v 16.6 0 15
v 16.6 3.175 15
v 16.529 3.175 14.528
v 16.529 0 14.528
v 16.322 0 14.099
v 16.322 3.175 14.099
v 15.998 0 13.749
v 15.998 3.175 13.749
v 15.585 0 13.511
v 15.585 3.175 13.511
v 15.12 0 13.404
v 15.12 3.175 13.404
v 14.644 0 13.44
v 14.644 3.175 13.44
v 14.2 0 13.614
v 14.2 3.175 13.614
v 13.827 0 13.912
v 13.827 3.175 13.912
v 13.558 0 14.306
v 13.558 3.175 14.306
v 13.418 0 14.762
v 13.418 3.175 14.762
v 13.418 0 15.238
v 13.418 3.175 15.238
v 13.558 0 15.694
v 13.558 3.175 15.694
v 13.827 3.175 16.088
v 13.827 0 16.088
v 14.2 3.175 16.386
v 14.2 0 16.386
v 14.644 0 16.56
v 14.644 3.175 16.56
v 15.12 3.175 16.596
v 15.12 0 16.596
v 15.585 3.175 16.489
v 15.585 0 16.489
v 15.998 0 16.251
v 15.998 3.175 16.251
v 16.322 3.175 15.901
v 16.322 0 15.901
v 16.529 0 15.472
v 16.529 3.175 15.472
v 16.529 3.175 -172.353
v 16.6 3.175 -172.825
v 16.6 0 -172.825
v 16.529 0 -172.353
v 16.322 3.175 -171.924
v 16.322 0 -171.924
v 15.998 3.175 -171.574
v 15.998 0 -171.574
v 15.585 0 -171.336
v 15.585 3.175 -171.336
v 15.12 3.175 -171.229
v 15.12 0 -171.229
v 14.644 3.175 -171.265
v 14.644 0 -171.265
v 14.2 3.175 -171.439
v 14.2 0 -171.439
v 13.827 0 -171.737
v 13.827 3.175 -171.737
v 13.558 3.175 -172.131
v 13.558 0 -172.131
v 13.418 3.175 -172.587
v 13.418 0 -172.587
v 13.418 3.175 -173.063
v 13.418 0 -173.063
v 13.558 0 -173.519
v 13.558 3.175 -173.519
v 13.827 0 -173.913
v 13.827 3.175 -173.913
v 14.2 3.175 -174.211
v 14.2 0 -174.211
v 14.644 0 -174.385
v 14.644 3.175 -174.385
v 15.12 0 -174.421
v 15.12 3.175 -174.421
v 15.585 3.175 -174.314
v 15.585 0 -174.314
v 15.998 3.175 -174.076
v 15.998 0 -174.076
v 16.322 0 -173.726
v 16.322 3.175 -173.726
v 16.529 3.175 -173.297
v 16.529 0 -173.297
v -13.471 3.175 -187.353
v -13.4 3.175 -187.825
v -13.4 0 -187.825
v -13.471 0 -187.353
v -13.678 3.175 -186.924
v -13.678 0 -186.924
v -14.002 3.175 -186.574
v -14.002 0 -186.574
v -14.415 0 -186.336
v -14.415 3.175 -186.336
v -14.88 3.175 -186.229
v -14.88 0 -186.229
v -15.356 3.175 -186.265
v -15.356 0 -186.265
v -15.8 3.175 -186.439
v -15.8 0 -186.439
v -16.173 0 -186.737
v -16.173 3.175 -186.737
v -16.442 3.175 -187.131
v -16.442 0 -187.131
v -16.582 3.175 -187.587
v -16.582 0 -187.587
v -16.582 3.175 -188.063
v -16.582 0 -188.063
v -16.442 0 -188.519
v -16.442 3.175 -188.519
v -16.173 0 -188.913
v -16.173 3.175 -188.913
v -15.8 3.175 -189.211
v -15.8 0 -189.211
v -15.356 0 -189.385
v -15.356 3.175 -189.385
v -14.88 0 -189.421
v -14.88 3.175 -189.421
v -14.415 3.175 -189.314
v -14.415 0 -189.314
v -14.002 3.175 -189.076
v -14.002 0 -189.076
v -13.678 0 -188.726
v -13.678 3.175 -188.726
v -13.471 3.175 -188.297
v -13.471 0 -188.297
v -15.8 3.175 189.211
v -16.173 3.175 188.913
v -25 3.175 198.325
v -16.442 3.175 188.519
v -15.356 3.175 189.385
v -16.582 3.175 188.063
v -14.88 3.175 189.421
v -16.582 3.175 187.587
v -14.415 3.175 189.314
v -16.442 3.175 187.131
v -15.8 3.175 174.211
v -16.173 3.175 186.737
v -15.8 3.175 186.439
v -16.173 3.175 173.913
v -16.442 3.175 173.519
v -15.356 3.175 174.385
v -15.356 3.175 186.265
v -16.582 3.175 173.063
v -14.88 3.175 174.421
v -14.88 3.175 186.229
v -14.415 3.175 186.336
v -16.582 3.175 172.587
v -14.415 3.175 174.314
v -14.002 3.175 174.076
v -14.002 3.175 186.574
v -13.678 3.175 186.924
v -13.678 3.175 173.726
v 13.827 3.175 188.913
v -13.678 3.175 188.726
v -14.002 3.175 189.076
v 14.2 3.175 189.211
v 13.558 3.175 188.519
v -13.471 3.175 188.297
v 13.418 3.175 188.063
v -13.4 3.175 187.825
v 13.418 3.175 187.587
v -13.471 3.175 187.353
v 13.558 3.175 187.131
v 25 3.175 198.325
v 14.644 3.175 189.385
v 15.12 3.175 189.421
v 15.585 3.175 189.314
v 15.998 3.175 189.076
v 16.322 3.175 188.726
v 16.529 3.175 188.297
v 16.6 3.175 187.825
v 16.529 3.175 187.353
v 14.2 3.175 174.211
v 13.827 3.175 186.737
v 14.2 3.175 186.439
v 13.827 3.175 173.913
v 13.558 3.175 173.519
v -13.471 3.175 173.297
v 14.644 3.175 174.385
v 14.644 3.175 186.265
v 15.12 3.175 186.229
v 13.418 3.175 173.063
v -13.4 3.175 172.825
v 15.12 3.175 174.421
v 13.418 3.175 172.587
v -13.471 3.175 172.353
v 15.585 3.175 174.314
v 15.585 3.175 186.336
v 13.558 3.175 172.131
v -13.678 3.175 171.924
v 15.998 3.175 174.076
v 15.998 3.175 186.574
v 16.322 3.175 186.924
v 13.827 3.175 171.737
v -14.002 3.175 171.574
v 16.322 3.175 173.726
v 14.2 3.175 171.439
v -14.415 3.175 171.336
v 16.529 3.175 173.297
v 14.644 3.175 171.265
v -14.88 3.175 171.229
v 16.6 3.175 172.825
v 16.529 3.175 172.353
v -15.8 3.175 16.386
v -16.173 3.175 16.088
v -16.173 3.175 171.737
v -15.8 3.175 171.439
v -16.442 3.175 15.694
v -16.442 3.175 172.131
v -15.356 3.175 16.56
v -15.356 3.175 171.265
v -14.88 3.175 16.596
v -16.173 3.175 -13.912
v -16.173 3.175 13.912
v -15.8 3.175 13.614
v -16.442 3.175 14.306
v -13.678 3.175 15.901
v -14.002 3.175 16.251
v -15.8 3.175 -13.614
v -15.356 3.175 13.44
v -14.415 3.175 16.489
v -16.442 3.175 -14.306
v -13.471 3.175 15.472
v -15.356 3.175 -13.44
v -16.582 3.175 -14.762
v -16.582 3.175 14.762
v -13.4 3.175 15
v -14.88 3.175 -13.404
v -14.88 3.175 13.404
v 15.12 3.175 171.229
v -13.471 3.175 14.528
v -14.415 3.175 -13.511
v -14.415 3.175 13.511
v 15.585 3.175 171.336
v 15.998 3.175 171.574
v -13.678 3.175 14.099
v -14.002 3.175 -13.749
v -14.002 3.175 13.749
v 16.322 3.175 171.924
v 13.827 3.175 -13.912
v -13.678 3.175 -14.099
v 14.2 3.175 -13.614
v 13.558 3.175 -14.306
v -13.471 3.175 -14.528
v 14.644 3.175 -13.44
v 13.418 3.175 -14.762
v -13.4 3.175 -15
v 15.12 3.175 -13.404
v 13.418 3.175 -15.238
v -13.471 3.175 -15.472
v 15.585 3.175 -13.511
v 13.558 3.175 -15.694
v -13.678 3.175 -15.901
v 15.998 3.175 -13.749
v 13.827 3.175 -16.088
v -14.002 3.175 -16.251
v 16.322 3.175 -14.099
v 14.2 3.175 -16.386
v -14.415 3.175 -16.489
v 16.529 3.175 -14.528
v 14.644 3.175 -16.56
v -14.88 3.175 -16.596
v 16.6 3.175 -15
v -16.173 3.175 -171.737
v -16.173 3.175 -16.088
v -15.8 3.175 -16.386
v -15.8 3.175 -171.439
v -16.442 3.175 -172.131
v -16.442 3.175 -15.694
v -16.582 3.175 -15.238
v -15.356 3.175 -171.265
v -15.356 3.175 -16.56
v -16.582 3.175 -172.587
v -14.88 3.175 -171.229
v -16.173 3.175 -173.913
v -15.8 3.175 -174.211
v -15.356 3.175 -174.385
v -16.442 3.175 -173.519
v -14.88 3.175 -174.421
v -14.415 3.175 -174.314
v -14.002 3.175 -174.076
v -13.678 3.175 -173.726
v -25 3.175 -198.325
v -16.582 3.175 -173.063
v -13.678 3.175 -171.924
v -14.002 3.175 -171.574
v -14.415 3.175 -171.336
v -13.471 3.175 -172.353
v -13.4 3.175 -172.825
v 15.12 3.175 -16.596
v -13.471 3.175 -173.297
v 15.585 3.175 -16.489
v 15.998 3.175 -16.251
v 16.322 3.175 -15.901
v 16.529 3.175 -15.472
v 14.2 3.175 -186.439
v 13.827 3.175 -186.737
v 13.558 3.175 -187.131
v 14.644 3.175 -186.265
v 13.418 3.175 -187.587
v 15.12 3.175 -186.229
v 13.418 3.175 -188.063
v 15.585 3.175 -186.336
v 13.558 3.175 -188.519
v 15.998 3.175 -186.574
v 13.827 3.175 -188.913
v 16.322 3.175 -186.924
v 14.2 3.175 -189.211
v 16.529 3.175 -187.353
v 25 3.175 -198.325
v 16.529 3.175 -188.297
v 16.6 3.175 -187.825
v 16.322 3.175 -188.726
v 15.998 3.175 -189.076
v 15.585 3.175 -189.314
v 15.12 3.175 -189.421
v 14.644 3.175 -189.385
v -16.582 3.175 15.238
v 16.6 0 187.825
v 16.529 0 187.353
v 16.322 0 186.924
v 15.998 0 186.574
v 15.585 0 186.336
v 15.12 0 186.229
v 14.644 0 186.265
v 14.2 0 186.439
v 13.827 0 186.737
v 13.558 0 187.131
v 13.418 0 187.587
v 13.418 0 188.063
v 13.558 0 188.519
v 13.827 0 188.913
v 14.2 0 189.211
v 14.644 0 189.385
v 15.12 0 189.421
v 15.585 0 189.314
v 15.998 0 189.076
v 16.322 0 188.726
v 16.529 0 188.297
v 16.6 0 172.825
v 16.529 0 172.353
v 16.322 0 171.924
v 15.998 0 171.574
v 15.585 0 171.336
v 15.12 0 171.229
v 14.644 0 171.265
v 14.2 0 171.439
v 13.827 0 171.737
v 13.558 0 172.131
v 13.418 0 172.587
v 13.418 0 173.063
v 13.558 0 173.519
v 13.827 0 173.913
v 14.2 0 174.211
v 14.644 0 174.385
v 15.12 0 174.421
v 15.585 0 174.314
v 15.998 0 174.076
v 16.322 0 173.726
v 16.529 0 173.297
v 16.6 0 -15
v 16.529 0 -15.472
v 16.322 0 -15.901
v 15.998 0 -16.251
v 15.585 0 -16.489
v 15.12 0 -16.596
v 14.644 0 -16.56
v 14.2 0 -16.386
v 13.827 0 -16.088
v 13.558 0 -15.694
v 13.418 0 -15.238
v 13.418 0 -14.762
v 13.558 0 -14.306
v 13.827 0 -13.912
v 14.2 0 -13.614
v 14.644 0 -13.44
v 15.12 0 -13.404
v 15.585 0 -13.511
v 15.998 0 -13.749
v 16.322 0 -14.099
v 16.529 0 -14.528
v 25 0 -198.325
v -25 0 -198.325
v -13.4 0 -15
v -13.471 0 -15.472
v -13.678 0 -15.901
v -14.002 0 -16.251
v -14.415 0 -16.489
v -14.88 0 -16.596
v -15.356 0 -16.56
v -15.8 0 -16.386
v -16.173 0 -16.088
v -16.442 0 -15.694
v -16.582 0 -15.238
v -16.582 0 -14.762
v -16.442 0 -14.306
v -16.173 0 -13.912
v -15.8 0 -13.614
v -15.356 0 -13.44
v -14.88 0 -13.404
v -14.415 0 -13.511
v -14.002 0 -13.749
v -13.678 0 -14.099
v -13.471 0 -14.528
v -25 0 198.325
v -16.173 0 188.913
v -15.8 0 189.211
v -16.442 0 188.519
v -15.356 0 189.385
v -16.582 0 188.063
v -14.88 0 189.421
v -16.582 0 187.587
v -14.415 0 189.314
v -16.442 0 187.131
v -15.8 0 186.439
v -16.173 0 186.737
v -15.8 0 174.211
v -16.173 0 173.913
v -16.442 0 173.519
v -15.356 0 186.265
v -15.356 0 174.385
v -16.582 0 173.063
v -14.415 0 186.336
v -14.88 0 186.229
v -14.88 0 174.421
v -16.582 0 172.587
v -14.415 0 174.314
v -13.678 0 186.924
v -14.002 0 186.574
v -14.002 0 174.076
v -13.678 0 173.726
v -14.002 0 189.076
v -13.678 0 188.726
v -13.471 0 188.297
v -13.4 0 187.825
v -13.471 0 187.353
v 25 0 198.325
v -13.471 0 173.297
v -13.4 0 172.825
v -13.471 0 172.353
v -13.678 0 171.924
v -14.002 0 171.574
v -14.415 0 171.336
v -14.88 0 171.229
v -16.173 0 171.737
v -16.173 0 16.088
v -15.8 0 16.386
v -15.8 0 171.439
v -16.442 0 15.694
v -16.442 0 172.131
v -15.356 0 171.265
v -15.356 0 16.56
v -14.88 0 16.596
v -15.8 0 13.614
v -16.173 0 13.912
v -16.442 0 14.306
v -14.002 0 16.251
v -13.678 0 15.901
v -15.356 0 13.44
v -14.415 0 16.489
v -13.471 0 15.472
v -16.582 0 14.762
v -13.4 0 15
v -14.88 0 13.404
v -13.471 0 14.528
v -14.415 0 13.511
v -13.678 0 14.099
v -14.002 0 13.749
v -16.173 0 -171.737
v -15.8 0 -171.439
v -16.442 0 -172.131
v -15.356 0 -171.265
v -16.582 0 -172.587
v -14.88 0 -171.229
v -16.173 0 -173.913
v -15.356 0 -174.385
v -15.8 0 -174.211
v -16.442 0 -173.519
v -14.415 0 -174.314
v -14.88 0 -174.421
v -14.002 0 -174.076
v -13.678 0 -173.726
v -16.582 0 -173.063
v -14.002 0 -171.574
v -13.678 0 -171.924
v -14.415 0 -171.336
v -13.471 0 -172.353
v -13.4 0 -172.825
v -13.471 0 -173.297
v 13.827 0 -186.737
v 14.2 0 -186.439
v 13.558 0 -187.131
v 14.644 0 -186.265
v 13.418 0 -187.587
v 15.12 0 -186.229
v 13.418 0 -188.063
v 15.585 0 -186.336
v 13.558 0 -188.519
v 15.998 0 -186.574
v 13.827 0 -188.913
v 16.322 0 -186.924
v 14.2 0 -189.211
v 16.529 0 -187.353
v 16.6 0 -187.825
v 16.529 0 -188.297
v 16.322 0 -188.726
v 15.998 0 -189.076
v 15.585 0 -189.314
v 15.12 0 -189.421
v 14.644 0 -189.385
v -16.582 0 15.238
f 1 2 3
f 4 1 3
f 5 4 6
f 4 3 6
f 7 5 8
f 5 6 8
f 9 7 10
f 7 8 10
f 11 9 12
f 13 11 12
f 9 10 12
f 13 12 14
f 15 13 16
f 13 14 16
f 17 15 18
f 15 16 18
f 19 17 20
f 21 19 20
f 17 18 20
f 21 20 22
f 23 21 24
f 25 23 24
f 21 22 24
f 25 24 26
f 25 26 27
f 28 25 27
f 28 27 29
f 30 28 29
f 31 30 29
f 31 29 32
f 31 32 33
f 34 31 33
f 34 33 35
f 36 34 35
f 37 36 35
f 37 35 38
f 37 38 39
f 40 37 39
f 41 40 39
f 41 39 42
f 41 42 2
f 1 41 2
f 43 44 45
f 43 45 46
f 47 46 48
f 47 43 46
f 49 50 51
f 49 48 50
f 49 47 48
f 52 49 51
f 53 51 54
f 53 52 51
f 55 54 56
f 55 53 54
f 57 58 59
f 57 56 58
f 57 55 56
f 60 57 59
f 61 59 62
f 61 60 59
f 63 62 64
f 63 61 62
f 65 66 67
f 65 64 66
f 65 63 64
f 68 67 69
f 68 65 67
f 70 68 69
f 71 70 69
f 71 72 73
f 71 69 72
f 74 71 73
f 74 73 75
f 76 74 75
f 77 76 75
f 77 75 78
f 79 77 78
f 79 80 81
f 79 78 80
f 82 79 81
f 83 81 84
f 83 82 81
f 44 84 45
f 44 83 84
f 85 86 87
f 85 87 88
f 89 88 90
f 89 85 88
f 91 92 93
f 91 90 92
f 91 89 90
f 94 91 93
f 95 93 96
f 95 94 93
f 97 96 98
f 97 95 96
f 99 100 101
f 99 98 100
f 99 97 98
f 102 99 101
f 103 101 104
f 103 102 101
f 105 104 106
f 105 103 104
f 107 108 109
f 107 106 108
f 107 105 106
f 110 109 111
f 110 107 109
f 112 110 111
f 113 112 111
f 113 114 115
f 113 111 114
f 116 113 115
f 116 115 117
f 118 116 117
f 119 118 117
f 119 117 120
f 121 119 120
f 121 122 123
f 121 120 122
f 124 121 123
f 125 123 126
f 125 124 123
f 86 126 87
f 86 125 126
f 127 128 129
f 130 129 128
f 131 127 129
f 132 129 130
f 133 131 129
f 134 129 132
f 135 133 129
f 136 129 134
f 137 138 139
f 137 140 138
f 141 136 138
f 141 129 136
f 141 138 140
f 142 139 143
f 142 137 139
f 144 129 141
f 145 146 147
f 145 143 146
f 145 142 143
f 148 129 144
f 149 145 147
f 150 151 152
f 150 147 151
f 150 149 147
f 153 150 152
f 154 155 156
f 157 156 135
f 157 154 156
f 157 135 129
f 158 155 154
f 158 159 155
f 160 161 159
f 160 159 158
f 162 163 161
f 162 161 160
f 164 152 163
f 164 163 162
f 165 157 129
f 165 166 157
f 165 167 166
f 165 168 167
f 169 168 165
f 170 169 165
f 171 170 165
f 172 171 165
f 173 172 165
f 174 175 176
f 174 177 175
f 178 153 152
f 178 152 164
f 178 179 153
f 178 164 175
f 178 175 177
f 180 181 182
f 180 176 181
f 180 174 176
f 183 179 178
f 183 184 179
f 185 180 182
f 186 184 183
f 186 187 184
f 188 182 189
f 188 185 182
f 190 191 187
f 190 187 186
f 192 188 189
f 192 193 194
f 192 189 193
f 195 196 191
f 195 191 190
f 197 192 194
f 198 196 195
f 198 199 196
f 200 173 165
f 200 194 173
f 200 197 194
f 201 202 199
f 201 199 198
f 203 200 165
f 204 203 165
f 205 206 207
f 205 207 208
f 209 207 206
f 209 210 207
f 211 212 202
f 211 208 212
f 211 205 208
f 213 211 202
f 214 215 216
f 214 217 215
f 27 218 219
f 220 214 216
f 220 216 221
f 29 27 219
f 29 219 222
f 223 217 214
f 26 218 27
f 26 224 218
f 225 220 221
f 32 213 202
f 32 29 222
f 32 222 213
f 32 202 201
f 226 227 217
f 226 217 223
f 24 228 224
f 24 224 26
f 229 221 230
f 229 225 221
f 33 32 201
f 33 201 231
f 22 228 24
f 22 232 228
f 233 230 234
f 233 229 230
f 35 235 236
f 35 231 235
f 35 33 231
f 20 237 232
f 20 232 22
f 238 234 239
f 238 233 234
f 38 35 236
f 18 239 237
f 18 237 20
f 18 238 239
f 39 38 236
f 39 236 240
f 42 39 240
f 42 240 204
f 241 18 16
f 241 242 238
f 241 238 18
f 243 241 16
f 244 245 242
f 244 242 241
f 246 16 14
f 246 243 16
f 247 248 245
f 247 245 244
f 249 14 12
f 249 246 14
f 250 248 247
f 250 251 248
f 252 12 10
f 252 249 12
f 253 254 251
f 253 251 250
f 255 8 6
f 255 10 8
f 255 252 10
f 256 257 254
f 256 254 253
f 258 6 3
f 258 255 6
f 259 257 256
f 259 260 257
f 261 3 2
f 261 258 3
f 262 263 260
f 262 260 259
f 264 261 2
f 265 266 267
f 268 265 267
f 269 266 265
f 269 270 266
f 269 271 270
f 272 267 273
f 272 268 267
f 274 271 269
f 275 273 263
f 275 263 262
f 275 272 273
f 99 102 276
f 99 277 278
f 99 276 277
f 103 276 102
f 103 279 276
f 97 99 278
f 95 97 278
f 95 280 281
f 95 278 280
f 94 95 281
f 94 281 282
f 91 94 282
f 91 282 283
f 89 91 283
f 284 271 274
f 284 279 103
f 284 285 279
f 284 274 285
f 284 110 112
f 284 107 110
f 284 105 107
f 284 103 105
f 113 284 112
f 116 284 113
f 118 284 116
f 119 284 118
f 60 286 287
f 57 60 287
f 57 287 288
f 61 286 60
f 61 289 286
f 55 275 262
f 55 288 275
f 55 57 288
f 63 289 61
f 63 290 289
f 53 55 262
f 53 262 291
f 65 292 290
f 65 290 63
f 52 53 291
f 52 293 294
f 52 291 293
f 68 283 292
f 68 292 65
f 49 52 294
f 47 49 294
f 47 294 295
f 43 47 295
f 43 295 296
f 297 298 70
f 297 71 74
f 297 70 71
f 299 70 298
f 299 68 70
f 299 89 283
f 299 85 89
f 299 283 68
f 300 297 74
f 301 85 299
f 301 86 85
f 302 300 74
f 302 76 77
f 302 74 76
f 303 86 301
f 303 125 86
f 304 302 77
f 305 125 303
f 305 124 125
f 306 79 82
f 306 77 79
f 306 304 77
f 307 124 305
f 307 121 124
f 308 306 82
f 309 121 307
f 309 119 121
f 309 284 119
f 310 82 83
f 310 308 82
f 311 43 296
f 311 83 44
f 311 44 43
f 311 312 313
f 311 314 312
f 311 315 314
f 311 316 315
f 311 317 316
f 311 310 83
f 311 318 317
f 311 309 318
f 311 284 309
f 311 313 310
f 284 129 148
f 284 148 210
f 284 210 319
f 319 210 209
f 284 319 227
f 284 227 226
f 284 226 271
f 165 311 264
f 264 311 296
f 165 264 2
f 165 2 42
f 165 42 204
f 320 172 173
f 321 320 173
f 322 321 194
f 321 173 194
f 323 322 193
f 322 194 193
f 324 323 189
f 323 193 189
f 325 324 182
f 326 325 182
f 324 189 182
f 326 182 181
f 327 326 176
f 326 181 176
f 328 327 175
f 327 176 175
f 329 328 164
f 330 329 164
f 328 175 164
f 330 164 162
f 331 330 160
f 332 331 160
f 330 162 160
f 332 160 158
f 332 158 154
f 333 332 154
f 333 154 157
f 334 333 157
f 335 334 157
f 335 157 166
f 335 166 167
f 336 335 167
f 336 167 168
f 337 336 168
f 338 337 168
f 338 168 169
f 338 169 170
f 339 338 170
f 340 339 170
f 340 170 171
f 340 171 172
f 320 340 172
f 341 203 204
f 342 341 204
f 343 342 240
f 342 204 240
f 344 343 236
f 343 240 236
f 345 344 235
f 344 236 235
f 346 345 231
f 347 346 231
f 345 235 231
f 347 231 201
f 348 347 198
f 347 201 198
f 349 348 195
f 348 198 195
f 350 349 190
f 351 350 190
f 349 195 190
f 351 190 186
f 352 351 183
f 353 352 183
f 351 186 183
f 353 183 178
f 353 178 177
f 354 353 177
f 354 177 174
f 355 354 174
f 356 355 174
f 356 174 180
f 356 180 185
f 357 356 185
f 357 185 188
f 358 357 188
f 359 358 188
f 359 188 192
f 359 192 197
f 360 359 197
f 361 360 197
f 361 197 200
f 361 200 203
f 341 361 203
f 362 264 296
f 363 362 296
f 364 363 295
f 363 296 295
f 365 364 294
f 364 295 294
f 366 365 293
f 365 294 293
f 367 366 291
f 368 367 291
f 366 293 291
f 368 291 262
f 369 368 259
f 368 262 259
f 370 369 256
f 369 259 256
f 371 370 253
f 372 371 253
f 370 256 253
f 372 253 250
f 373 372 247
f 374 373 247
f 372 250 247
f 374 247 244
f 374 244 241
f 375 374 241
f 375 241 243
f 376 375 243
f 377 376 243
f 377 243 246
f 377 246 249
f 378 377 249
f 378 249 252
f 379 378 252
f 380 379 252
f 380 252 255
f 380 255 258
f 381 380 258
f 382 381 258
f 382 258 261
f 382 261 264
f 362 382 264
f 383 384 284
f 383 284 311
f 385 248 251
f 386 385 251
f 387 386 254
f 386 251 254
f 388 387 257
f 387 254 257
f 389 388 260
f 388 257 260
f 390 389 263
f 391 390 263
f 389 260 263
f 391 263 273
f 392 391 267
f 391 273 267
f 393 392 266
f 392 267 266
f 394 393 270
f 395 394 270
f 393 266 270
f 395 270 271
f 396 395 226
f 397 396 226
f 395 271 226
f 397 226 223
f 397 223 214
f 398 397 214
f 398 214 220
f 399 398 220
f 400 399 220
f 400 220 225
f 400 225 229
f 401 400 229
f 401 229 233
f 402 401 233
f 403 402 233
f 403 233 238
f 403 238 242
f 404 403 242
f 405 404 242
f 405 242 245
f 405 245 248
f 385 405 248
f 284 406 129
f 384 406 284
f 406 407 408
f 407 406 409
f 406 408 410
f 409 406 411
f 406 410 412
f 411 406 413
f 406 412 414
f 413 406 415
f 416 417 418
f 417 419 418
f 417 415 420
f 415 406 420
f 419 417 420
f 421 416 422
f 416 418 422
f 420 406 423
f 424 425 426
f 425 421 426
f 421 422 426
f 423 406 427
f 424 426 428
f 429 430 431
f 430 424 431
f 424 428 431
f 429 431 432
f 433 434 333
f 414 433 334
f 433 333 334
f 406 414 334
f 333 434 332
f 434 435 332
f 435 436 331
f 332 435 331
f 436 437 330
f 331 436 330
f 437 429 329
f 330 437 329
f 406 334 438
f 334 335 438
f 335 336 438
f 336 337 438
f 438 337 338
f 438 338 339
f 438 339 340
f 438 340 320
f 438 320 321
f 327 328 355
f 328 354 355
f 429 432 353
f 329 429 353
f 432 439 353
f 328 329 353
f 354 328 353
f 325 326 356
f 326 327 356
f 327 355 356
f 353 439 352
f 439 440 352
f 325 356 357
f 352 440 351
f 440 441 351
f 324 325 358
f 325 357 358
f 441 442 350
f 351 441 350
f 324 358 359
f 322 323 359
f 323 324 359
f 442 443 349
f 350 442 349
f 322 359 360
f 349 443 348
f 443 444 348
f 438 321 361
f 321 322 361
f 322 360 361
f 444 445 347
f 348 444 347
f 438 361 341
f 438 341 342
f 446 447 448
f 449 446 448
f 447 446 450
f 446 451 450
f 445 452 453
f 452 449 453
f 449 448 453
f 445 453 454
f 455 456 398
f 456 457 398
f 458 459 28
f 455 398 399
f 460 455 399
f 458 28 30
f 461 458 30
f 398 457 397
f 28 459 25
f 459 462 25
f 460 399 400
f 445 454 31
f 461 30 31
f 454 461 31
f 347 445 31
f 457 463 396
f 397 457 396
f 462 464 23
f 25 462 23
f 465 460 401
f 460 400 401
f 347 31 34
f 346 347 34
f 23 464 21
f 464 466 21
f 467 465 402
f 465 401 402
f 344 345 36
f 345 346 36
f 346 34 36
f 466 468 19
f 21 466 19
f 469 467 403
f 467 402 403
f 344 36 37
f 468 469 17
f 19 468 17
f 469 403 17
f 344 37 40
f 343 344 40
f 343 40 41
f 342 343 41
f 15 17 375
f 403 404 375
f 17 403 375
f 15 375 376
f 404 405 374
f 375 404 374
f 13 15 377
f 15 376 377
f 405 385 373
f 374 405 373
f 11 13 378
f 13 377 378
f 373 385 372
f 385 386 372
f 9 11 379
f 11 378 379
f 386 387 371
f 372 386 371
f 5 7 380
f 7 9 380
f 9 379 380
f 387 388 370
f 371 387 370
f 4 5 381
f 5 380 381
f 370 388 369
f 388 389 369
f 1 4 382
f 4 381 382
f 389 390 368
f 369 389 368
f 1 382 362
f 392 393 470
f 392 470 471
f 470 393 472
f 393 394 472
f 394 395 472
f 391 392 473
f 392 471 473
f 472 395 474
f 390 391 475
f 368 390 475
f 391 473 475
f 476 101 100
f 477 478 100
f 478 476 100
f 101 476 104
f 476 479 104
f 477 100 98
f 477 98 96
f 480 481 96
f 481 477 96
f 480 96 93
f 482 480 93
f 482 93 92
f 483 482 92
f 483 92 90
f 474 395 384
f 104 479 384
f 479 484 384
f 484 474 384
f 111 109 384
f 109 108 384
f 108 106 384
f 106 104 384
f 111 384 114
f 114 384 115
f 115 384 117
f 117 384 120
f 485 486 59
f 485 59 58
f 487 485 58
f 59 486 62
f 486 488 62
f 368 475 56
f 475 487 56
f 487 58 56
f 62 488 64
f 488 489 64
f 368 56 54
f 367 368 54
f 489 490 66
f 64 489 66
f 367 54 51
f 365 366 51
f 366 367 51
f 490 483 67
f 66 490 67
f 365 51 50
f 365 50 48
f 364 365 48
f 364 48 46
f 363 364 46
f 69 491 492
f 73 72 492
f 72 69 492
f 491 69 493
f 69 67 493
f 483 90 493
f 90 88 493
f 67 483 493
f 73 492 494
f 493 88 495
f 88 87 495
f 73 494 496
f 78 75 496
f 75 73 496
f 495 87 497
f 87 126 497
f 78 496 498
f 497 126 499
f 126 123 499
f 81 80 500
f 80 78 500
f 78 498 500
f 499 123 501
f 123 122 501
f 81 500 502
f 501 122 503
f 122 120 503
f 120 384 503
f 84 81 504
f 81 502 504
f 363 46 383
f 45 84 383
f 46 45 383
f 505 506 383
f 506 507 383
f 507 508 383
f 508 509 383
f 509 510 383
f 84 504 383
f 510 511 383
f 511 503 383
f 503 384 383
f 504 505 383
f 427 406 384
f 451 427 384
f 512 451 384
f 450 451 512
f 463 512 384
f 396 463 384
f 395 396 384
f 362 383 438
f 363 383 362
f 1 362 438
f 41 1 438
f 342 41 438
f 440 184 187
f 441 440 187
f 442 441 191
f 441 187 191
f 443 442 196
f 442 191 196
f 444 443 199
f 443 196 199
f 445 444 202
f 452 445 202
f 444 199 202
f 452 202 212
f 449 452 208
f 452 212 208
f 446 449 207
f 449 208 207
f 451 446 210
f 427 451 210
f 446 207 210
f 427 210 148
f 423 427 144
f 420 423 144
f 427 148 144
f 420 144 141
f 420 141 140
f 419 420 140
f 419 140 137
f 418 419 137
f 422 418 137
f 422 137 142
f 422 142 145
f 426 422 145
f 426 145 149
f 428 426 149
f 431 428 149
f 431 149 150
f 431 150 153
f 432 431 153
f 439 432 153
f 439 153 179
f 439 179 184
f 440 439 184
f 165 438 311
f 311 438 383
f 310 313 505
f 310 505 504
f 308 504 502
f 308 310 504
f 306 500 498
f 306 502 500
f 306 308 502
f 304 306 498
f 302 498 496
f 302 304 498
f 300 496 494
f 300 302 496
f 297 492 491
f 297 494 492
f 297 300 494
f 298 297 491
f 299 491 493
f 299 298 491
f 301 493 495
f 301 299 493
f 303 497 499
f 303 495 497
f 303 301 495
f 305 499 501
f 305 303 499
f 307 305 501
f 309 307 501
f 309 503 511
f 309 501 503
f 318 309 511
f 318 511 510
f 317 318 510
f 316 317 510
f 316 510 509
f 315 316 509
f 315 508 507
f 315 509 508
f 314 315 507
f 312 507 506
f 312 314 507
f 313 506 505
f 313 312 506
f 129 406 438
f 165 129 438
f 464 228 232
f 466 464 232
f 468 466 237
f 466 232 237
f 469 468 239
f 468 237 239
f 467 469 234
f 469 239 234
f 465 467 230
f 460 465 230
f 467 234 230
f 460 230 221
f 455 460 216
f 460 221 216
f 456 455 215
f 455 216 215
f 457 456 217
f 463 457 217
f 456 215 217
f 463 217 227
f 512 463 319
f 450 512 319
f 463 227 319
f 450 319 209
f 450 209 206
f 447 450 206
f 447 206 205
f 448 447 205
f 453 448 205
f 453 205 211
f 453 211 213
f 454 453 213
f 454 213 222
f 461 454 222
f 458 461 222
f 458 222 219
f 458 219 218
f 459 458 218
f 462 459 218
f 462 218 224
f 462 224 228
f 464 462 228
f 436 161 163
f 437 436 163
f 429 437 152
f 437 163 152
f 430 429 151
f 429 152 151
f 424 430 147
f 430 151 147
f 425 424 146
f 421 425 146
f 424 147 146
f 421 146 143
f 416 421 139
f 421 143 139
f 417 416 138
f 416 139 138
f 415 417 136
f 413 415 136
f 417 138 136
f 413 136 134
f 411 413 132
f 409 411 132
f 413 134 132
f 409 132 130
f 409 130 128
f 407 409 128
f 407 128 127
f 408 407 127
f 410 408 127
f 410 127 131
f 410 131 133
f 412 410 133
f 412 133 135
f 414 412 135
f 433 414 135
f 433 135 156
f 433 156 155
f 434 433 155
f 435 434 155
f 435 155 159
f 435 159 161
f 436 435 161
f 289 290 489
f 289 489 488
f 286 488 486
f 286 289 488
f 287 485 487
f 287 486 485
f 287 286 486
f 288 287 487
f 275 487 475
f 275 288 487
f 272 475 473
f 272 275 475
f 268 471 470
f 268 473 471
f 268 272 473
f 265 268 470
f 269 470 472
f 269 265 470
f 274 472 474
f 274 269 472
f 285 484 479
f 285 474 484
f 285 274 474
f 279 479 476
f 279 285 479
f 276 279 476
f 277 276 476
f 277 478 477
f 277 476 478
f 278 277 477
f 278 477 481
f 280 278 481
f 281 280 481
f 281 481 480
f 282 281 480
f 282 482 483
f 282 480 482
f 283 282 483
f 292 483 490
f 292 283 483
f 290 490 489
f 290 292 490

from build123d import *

# Parameters (mm, degrees)
SKETCH1_W            = 50
SKETCH1_H            = 396.65
BOSS_EXTRUDE1_DEPTH  = 3.175
M3_CLEARANCE_HOLE1_D = 3.2
M3_CLEARANCE_HOLE2_D = 3.2


with BuildPart() as part:
    # Sketch1 → Boss-Extrude1 (new body)
    with BuildSketch(Plane(origin=(0, 0, 0), x_dir=(1, 0, 0), z_dir=(0, 1, 0))):
        Rectangle(SKETCH1_W, SKETCH1_H)
    extrude(amount=BOSS_EXTRUDE1_DEPTH)

    # M3 Clearance Hole1 (through all)
    with Locations(Plane(origin=(0, 0, 0), x_dir=(-1, 0, 0), z_dir=(0, -1, 0))):
        with Locations((15, -187.825), (-15, -172.825), (-15, -187.825), (15, -172.825)):
            m3_clearance_hole1 = Hole(M3_CLEARANCE_HOLE1_D / 2)

    # Mirror1: M3 Clearance Hole1 across plane
    add(m3_clearance_hole1.mirror(Plane.XY), mode=Mode.SUBTRACT)

    # M3 Clearance Hole2 (through all)
    with Locations(Plane(origin=(0, 0, 0), x_dir=(-1, 0, 0), z_dir=(0, -1, 0))):
        with Locations((15, -15), (-15, 15), (-15, -15), (15, 15)):
            Hole(M3_CLEARANCE_HOLE2_D / 2)


solid = part.part
